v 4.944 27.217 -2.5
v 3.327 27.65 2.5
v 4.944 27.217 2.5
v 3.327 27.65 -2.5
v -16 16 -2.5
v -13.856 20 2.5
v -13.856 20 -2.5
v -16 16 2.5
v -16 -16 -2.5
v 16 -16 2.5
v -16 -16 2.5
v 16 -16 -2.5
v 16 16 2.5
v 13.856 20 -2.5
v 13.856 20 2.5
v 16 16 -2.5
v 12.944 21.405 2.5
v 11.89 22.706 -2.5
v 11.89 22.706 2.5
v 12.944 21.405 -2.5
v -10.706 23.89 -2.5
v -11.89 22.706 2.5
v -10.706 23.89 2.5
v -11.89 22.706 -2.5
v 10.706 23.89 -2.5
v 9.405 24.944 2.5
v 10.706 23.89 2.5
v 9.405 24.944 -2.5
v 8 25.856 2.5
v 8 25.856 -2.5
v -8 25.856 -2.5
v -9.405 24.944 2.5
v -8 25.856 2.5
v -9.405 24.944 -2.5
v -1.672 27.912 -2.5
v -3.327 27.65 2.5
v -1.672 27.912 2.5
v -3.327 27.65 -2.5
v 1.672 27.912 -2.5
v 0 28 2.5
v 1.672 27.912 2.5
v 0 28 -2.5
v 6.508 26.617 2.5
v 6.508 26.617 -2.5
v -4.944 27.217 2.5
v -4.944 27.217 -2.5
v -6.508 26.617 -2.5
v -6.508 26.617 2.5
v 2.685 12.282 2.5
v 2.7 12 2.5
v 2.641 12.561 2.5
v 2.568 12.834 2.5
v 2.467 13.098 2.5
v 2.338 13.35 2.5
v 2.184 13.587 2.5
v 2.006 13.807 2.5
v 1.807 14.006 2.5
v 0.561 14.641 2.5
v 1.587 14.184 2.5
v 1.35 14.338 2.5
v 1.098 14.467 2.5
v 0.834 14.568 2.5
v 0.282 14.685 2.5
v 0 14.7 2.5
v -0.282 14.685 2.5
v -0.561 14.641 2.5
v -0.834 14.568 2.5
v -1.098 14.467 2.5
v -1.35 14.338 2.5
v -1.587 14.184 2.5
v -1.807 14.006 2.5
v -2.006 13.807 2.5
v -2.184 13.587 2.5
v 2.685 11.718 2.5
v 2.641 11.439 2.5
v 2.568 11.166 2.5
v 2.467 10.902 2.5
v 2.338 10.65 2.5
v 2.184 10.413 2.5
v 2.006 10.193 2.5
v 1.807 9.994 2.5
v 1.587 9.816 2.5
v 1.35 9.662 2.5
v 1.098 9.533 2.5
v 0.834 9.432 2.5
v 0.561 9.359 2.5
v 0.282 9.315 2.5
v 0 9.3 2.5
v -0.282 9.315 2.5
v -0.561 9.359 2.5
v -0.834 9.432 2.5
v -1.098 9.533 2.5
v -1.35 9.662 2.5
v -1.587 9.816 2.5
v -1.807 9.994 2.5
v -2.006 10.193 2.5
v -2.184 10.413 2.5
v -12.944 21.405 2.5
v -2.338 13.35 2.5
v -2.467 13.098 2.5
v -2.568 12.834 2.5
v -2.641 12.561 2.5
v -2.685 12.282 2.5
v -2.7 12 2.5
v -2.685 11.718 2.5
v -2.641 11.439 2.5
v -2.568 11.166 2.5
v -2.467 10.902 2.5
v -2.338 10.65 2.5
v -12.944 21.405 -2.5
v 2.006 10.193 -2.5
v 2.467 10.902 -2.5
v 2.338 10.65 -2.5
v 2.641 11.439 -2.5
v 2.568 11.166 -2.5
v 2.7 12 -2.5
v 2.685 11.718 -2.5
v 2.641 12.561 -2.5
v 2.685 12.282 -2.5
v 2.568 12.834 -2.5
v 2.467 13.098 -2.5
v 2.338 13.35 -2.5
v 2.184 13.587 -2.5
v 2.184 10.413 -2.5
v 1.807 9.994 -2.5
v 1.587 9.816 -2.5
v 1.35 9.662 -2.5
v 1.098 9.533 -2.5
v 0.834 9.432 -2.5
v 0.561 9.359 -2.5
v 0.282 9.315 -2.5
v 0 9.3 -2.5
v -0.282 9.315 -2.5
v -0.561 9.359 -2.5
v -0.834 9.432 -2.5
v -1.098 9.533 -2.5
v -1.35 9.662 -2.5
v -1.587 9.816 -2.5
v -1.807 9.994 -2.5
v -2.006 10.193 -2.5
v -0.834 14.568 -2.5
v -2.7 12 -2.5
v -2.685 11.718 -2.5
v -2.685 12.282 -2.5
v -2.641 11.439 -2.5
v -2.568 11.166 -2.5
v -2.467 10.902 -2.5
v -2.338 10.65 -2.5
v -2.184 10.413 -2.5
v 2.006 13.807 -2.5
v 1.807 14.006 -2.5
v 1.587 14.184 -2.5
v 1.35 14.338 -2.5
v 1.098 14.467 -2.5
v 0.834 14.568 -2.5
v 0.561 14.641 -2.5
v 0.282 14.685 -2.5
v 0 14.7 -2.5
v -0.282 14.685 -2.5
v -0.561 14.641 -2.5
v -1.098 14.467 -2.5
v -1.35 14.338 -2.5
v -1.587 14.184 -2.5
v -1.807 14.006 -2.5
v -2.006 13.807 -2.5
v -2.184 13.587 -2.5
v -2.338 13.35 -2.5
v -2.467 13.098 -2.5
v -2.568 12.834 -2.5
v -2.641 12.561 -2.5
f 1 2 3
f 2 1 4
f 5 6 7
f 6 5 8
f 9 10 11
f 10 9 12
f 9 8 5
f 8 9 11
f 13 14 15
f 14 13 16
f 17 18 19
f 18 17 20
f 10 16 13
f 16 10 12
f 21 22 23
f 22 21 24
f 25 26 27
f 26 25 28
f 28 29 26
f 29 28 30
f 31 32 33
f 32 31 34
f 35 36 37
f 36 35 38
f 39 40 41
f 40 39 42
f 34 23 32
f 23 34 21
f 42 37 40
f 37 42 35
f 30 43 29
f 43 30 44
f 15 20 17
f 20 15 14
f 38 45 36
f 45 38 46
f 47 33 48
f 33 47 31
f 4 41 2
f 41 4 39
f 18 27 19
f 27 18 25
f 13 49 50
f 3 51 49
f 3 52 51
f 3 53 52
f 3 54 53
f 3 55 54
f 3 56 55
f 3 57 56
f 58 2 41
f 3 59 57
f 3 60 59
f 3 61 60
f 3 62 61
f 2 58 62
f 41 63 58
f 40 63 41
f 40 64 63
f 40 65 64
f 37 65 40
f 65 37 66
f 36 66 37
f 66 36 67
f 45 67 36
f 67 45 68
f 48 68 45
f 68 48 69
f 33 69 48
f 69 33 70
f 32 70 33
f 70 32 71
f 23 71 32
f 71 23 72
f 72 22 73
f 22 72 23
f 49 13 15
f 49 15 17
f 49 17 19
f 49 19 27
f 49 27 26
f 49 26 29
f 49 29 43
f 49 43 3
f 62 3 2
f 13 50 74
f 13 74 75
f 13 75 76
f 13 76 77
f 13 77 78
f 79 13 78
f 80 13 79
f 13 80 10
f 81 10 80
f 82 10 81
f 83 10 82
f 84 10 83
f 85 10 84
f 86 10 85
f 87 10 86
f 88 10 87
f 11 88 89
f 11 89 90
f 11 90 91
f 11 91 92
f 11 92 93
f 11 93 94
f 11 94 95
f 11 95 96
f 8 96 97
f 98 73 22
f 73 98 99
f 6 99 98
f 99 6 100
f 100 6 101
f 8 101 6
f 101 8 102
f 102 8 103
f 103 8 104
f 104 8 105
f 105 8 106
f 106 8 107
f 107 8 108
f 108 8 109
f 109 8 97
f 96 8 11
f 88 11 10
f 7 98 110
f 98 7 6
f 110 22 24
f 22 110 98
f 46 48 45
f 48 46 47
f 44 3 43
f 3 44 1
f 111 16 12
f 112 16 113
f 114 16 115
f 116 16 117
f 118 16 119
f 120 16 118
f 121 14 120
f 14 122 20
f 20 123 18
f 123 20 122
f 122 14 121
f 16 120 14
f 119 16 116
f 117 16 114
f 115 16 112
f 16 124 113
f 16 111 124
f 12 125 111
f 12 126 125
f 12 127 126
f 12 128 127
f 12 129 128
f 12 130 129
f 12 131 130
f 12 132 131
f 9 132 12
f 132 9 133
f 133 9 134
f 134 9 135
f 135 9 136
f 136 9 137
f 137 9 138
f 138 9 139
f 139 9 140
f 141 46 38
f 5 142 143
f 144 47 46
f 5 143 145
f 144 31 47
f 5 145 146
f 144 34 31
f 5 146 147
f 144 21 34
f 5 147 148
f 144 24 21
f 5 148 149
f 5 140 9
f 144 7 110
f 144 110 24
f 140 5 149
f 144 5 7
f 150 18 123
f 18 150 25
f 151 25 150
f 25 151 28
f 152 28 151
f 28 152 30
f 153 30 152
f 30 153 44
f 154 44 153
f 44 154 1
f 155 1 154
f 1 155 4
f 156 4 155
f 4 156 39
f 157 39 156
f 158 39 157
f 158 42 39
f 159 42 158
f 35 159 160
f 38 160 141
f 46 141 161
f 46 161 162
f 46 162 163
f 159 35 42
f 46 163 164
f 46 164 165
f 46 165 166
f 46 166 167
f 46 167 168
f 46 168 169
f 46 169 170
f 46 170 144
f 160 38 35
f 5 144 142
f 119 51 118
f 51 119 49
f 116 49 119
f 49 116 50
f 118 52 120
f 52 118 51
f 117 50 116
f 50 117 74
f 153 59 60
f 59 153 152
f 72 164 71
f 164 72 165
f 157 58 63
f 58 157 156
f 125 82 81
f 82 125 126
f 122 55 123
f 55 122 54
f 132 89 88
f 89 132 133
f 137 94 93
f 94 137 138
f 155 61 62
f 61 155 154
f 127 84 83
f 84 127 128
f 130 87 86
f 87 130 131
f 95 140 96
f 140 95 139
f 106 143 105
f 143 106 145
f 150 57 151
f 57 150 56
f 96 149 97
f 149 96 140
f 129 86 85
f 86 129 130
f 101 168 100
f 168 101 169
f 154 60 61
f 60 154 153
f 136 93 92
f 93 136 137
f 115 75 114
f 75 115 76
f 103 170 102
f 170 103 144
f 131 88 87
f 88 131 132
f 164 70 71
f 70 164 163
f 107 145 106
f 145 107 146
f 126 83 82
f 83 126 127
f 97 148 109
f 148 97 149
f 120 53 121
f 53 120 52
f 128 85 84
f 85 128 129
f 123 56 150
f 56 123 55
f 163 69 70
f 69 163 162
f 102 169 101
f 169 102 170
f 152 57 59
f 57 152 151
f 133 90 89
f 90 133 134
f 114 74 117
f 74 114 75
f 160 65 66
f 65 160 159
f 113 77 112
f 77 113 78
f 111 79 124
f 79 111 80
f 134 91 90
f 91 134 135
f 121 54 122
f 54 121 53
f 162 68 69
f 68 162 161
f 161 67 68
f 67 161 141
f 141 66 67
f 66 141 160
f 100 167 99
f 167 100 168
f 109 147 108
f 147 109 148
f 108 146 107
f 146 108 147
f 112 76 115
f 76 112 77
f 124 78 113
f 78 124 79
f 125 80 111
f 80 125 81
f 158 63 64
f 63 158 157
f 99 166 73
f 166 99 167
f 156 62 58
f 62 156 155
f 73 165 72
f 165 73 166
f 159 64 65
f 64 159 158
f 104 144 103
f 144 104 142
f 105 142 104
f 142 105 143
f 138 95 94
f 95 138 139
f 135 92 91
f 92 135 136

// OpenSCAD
// Single-hole mounting tab.
$fn = 60;
eps = 0.02;
tab_w = 32;
tab_h = 56;
tab_t = 5;
difference() {
    hull() { translate([0,0,0]) cube([tab_w,tab_w,tab_t],center=true); translate([0,tab_h/2-tab_w/2,0]) cylinder(d=tab_w,h=tab_t,center=true); }
    translate([0,tab_h/2-tab_w/2,-tab_t/2-eps]) cylinder(d=5.4,h=tab_t+2*eps);
}
